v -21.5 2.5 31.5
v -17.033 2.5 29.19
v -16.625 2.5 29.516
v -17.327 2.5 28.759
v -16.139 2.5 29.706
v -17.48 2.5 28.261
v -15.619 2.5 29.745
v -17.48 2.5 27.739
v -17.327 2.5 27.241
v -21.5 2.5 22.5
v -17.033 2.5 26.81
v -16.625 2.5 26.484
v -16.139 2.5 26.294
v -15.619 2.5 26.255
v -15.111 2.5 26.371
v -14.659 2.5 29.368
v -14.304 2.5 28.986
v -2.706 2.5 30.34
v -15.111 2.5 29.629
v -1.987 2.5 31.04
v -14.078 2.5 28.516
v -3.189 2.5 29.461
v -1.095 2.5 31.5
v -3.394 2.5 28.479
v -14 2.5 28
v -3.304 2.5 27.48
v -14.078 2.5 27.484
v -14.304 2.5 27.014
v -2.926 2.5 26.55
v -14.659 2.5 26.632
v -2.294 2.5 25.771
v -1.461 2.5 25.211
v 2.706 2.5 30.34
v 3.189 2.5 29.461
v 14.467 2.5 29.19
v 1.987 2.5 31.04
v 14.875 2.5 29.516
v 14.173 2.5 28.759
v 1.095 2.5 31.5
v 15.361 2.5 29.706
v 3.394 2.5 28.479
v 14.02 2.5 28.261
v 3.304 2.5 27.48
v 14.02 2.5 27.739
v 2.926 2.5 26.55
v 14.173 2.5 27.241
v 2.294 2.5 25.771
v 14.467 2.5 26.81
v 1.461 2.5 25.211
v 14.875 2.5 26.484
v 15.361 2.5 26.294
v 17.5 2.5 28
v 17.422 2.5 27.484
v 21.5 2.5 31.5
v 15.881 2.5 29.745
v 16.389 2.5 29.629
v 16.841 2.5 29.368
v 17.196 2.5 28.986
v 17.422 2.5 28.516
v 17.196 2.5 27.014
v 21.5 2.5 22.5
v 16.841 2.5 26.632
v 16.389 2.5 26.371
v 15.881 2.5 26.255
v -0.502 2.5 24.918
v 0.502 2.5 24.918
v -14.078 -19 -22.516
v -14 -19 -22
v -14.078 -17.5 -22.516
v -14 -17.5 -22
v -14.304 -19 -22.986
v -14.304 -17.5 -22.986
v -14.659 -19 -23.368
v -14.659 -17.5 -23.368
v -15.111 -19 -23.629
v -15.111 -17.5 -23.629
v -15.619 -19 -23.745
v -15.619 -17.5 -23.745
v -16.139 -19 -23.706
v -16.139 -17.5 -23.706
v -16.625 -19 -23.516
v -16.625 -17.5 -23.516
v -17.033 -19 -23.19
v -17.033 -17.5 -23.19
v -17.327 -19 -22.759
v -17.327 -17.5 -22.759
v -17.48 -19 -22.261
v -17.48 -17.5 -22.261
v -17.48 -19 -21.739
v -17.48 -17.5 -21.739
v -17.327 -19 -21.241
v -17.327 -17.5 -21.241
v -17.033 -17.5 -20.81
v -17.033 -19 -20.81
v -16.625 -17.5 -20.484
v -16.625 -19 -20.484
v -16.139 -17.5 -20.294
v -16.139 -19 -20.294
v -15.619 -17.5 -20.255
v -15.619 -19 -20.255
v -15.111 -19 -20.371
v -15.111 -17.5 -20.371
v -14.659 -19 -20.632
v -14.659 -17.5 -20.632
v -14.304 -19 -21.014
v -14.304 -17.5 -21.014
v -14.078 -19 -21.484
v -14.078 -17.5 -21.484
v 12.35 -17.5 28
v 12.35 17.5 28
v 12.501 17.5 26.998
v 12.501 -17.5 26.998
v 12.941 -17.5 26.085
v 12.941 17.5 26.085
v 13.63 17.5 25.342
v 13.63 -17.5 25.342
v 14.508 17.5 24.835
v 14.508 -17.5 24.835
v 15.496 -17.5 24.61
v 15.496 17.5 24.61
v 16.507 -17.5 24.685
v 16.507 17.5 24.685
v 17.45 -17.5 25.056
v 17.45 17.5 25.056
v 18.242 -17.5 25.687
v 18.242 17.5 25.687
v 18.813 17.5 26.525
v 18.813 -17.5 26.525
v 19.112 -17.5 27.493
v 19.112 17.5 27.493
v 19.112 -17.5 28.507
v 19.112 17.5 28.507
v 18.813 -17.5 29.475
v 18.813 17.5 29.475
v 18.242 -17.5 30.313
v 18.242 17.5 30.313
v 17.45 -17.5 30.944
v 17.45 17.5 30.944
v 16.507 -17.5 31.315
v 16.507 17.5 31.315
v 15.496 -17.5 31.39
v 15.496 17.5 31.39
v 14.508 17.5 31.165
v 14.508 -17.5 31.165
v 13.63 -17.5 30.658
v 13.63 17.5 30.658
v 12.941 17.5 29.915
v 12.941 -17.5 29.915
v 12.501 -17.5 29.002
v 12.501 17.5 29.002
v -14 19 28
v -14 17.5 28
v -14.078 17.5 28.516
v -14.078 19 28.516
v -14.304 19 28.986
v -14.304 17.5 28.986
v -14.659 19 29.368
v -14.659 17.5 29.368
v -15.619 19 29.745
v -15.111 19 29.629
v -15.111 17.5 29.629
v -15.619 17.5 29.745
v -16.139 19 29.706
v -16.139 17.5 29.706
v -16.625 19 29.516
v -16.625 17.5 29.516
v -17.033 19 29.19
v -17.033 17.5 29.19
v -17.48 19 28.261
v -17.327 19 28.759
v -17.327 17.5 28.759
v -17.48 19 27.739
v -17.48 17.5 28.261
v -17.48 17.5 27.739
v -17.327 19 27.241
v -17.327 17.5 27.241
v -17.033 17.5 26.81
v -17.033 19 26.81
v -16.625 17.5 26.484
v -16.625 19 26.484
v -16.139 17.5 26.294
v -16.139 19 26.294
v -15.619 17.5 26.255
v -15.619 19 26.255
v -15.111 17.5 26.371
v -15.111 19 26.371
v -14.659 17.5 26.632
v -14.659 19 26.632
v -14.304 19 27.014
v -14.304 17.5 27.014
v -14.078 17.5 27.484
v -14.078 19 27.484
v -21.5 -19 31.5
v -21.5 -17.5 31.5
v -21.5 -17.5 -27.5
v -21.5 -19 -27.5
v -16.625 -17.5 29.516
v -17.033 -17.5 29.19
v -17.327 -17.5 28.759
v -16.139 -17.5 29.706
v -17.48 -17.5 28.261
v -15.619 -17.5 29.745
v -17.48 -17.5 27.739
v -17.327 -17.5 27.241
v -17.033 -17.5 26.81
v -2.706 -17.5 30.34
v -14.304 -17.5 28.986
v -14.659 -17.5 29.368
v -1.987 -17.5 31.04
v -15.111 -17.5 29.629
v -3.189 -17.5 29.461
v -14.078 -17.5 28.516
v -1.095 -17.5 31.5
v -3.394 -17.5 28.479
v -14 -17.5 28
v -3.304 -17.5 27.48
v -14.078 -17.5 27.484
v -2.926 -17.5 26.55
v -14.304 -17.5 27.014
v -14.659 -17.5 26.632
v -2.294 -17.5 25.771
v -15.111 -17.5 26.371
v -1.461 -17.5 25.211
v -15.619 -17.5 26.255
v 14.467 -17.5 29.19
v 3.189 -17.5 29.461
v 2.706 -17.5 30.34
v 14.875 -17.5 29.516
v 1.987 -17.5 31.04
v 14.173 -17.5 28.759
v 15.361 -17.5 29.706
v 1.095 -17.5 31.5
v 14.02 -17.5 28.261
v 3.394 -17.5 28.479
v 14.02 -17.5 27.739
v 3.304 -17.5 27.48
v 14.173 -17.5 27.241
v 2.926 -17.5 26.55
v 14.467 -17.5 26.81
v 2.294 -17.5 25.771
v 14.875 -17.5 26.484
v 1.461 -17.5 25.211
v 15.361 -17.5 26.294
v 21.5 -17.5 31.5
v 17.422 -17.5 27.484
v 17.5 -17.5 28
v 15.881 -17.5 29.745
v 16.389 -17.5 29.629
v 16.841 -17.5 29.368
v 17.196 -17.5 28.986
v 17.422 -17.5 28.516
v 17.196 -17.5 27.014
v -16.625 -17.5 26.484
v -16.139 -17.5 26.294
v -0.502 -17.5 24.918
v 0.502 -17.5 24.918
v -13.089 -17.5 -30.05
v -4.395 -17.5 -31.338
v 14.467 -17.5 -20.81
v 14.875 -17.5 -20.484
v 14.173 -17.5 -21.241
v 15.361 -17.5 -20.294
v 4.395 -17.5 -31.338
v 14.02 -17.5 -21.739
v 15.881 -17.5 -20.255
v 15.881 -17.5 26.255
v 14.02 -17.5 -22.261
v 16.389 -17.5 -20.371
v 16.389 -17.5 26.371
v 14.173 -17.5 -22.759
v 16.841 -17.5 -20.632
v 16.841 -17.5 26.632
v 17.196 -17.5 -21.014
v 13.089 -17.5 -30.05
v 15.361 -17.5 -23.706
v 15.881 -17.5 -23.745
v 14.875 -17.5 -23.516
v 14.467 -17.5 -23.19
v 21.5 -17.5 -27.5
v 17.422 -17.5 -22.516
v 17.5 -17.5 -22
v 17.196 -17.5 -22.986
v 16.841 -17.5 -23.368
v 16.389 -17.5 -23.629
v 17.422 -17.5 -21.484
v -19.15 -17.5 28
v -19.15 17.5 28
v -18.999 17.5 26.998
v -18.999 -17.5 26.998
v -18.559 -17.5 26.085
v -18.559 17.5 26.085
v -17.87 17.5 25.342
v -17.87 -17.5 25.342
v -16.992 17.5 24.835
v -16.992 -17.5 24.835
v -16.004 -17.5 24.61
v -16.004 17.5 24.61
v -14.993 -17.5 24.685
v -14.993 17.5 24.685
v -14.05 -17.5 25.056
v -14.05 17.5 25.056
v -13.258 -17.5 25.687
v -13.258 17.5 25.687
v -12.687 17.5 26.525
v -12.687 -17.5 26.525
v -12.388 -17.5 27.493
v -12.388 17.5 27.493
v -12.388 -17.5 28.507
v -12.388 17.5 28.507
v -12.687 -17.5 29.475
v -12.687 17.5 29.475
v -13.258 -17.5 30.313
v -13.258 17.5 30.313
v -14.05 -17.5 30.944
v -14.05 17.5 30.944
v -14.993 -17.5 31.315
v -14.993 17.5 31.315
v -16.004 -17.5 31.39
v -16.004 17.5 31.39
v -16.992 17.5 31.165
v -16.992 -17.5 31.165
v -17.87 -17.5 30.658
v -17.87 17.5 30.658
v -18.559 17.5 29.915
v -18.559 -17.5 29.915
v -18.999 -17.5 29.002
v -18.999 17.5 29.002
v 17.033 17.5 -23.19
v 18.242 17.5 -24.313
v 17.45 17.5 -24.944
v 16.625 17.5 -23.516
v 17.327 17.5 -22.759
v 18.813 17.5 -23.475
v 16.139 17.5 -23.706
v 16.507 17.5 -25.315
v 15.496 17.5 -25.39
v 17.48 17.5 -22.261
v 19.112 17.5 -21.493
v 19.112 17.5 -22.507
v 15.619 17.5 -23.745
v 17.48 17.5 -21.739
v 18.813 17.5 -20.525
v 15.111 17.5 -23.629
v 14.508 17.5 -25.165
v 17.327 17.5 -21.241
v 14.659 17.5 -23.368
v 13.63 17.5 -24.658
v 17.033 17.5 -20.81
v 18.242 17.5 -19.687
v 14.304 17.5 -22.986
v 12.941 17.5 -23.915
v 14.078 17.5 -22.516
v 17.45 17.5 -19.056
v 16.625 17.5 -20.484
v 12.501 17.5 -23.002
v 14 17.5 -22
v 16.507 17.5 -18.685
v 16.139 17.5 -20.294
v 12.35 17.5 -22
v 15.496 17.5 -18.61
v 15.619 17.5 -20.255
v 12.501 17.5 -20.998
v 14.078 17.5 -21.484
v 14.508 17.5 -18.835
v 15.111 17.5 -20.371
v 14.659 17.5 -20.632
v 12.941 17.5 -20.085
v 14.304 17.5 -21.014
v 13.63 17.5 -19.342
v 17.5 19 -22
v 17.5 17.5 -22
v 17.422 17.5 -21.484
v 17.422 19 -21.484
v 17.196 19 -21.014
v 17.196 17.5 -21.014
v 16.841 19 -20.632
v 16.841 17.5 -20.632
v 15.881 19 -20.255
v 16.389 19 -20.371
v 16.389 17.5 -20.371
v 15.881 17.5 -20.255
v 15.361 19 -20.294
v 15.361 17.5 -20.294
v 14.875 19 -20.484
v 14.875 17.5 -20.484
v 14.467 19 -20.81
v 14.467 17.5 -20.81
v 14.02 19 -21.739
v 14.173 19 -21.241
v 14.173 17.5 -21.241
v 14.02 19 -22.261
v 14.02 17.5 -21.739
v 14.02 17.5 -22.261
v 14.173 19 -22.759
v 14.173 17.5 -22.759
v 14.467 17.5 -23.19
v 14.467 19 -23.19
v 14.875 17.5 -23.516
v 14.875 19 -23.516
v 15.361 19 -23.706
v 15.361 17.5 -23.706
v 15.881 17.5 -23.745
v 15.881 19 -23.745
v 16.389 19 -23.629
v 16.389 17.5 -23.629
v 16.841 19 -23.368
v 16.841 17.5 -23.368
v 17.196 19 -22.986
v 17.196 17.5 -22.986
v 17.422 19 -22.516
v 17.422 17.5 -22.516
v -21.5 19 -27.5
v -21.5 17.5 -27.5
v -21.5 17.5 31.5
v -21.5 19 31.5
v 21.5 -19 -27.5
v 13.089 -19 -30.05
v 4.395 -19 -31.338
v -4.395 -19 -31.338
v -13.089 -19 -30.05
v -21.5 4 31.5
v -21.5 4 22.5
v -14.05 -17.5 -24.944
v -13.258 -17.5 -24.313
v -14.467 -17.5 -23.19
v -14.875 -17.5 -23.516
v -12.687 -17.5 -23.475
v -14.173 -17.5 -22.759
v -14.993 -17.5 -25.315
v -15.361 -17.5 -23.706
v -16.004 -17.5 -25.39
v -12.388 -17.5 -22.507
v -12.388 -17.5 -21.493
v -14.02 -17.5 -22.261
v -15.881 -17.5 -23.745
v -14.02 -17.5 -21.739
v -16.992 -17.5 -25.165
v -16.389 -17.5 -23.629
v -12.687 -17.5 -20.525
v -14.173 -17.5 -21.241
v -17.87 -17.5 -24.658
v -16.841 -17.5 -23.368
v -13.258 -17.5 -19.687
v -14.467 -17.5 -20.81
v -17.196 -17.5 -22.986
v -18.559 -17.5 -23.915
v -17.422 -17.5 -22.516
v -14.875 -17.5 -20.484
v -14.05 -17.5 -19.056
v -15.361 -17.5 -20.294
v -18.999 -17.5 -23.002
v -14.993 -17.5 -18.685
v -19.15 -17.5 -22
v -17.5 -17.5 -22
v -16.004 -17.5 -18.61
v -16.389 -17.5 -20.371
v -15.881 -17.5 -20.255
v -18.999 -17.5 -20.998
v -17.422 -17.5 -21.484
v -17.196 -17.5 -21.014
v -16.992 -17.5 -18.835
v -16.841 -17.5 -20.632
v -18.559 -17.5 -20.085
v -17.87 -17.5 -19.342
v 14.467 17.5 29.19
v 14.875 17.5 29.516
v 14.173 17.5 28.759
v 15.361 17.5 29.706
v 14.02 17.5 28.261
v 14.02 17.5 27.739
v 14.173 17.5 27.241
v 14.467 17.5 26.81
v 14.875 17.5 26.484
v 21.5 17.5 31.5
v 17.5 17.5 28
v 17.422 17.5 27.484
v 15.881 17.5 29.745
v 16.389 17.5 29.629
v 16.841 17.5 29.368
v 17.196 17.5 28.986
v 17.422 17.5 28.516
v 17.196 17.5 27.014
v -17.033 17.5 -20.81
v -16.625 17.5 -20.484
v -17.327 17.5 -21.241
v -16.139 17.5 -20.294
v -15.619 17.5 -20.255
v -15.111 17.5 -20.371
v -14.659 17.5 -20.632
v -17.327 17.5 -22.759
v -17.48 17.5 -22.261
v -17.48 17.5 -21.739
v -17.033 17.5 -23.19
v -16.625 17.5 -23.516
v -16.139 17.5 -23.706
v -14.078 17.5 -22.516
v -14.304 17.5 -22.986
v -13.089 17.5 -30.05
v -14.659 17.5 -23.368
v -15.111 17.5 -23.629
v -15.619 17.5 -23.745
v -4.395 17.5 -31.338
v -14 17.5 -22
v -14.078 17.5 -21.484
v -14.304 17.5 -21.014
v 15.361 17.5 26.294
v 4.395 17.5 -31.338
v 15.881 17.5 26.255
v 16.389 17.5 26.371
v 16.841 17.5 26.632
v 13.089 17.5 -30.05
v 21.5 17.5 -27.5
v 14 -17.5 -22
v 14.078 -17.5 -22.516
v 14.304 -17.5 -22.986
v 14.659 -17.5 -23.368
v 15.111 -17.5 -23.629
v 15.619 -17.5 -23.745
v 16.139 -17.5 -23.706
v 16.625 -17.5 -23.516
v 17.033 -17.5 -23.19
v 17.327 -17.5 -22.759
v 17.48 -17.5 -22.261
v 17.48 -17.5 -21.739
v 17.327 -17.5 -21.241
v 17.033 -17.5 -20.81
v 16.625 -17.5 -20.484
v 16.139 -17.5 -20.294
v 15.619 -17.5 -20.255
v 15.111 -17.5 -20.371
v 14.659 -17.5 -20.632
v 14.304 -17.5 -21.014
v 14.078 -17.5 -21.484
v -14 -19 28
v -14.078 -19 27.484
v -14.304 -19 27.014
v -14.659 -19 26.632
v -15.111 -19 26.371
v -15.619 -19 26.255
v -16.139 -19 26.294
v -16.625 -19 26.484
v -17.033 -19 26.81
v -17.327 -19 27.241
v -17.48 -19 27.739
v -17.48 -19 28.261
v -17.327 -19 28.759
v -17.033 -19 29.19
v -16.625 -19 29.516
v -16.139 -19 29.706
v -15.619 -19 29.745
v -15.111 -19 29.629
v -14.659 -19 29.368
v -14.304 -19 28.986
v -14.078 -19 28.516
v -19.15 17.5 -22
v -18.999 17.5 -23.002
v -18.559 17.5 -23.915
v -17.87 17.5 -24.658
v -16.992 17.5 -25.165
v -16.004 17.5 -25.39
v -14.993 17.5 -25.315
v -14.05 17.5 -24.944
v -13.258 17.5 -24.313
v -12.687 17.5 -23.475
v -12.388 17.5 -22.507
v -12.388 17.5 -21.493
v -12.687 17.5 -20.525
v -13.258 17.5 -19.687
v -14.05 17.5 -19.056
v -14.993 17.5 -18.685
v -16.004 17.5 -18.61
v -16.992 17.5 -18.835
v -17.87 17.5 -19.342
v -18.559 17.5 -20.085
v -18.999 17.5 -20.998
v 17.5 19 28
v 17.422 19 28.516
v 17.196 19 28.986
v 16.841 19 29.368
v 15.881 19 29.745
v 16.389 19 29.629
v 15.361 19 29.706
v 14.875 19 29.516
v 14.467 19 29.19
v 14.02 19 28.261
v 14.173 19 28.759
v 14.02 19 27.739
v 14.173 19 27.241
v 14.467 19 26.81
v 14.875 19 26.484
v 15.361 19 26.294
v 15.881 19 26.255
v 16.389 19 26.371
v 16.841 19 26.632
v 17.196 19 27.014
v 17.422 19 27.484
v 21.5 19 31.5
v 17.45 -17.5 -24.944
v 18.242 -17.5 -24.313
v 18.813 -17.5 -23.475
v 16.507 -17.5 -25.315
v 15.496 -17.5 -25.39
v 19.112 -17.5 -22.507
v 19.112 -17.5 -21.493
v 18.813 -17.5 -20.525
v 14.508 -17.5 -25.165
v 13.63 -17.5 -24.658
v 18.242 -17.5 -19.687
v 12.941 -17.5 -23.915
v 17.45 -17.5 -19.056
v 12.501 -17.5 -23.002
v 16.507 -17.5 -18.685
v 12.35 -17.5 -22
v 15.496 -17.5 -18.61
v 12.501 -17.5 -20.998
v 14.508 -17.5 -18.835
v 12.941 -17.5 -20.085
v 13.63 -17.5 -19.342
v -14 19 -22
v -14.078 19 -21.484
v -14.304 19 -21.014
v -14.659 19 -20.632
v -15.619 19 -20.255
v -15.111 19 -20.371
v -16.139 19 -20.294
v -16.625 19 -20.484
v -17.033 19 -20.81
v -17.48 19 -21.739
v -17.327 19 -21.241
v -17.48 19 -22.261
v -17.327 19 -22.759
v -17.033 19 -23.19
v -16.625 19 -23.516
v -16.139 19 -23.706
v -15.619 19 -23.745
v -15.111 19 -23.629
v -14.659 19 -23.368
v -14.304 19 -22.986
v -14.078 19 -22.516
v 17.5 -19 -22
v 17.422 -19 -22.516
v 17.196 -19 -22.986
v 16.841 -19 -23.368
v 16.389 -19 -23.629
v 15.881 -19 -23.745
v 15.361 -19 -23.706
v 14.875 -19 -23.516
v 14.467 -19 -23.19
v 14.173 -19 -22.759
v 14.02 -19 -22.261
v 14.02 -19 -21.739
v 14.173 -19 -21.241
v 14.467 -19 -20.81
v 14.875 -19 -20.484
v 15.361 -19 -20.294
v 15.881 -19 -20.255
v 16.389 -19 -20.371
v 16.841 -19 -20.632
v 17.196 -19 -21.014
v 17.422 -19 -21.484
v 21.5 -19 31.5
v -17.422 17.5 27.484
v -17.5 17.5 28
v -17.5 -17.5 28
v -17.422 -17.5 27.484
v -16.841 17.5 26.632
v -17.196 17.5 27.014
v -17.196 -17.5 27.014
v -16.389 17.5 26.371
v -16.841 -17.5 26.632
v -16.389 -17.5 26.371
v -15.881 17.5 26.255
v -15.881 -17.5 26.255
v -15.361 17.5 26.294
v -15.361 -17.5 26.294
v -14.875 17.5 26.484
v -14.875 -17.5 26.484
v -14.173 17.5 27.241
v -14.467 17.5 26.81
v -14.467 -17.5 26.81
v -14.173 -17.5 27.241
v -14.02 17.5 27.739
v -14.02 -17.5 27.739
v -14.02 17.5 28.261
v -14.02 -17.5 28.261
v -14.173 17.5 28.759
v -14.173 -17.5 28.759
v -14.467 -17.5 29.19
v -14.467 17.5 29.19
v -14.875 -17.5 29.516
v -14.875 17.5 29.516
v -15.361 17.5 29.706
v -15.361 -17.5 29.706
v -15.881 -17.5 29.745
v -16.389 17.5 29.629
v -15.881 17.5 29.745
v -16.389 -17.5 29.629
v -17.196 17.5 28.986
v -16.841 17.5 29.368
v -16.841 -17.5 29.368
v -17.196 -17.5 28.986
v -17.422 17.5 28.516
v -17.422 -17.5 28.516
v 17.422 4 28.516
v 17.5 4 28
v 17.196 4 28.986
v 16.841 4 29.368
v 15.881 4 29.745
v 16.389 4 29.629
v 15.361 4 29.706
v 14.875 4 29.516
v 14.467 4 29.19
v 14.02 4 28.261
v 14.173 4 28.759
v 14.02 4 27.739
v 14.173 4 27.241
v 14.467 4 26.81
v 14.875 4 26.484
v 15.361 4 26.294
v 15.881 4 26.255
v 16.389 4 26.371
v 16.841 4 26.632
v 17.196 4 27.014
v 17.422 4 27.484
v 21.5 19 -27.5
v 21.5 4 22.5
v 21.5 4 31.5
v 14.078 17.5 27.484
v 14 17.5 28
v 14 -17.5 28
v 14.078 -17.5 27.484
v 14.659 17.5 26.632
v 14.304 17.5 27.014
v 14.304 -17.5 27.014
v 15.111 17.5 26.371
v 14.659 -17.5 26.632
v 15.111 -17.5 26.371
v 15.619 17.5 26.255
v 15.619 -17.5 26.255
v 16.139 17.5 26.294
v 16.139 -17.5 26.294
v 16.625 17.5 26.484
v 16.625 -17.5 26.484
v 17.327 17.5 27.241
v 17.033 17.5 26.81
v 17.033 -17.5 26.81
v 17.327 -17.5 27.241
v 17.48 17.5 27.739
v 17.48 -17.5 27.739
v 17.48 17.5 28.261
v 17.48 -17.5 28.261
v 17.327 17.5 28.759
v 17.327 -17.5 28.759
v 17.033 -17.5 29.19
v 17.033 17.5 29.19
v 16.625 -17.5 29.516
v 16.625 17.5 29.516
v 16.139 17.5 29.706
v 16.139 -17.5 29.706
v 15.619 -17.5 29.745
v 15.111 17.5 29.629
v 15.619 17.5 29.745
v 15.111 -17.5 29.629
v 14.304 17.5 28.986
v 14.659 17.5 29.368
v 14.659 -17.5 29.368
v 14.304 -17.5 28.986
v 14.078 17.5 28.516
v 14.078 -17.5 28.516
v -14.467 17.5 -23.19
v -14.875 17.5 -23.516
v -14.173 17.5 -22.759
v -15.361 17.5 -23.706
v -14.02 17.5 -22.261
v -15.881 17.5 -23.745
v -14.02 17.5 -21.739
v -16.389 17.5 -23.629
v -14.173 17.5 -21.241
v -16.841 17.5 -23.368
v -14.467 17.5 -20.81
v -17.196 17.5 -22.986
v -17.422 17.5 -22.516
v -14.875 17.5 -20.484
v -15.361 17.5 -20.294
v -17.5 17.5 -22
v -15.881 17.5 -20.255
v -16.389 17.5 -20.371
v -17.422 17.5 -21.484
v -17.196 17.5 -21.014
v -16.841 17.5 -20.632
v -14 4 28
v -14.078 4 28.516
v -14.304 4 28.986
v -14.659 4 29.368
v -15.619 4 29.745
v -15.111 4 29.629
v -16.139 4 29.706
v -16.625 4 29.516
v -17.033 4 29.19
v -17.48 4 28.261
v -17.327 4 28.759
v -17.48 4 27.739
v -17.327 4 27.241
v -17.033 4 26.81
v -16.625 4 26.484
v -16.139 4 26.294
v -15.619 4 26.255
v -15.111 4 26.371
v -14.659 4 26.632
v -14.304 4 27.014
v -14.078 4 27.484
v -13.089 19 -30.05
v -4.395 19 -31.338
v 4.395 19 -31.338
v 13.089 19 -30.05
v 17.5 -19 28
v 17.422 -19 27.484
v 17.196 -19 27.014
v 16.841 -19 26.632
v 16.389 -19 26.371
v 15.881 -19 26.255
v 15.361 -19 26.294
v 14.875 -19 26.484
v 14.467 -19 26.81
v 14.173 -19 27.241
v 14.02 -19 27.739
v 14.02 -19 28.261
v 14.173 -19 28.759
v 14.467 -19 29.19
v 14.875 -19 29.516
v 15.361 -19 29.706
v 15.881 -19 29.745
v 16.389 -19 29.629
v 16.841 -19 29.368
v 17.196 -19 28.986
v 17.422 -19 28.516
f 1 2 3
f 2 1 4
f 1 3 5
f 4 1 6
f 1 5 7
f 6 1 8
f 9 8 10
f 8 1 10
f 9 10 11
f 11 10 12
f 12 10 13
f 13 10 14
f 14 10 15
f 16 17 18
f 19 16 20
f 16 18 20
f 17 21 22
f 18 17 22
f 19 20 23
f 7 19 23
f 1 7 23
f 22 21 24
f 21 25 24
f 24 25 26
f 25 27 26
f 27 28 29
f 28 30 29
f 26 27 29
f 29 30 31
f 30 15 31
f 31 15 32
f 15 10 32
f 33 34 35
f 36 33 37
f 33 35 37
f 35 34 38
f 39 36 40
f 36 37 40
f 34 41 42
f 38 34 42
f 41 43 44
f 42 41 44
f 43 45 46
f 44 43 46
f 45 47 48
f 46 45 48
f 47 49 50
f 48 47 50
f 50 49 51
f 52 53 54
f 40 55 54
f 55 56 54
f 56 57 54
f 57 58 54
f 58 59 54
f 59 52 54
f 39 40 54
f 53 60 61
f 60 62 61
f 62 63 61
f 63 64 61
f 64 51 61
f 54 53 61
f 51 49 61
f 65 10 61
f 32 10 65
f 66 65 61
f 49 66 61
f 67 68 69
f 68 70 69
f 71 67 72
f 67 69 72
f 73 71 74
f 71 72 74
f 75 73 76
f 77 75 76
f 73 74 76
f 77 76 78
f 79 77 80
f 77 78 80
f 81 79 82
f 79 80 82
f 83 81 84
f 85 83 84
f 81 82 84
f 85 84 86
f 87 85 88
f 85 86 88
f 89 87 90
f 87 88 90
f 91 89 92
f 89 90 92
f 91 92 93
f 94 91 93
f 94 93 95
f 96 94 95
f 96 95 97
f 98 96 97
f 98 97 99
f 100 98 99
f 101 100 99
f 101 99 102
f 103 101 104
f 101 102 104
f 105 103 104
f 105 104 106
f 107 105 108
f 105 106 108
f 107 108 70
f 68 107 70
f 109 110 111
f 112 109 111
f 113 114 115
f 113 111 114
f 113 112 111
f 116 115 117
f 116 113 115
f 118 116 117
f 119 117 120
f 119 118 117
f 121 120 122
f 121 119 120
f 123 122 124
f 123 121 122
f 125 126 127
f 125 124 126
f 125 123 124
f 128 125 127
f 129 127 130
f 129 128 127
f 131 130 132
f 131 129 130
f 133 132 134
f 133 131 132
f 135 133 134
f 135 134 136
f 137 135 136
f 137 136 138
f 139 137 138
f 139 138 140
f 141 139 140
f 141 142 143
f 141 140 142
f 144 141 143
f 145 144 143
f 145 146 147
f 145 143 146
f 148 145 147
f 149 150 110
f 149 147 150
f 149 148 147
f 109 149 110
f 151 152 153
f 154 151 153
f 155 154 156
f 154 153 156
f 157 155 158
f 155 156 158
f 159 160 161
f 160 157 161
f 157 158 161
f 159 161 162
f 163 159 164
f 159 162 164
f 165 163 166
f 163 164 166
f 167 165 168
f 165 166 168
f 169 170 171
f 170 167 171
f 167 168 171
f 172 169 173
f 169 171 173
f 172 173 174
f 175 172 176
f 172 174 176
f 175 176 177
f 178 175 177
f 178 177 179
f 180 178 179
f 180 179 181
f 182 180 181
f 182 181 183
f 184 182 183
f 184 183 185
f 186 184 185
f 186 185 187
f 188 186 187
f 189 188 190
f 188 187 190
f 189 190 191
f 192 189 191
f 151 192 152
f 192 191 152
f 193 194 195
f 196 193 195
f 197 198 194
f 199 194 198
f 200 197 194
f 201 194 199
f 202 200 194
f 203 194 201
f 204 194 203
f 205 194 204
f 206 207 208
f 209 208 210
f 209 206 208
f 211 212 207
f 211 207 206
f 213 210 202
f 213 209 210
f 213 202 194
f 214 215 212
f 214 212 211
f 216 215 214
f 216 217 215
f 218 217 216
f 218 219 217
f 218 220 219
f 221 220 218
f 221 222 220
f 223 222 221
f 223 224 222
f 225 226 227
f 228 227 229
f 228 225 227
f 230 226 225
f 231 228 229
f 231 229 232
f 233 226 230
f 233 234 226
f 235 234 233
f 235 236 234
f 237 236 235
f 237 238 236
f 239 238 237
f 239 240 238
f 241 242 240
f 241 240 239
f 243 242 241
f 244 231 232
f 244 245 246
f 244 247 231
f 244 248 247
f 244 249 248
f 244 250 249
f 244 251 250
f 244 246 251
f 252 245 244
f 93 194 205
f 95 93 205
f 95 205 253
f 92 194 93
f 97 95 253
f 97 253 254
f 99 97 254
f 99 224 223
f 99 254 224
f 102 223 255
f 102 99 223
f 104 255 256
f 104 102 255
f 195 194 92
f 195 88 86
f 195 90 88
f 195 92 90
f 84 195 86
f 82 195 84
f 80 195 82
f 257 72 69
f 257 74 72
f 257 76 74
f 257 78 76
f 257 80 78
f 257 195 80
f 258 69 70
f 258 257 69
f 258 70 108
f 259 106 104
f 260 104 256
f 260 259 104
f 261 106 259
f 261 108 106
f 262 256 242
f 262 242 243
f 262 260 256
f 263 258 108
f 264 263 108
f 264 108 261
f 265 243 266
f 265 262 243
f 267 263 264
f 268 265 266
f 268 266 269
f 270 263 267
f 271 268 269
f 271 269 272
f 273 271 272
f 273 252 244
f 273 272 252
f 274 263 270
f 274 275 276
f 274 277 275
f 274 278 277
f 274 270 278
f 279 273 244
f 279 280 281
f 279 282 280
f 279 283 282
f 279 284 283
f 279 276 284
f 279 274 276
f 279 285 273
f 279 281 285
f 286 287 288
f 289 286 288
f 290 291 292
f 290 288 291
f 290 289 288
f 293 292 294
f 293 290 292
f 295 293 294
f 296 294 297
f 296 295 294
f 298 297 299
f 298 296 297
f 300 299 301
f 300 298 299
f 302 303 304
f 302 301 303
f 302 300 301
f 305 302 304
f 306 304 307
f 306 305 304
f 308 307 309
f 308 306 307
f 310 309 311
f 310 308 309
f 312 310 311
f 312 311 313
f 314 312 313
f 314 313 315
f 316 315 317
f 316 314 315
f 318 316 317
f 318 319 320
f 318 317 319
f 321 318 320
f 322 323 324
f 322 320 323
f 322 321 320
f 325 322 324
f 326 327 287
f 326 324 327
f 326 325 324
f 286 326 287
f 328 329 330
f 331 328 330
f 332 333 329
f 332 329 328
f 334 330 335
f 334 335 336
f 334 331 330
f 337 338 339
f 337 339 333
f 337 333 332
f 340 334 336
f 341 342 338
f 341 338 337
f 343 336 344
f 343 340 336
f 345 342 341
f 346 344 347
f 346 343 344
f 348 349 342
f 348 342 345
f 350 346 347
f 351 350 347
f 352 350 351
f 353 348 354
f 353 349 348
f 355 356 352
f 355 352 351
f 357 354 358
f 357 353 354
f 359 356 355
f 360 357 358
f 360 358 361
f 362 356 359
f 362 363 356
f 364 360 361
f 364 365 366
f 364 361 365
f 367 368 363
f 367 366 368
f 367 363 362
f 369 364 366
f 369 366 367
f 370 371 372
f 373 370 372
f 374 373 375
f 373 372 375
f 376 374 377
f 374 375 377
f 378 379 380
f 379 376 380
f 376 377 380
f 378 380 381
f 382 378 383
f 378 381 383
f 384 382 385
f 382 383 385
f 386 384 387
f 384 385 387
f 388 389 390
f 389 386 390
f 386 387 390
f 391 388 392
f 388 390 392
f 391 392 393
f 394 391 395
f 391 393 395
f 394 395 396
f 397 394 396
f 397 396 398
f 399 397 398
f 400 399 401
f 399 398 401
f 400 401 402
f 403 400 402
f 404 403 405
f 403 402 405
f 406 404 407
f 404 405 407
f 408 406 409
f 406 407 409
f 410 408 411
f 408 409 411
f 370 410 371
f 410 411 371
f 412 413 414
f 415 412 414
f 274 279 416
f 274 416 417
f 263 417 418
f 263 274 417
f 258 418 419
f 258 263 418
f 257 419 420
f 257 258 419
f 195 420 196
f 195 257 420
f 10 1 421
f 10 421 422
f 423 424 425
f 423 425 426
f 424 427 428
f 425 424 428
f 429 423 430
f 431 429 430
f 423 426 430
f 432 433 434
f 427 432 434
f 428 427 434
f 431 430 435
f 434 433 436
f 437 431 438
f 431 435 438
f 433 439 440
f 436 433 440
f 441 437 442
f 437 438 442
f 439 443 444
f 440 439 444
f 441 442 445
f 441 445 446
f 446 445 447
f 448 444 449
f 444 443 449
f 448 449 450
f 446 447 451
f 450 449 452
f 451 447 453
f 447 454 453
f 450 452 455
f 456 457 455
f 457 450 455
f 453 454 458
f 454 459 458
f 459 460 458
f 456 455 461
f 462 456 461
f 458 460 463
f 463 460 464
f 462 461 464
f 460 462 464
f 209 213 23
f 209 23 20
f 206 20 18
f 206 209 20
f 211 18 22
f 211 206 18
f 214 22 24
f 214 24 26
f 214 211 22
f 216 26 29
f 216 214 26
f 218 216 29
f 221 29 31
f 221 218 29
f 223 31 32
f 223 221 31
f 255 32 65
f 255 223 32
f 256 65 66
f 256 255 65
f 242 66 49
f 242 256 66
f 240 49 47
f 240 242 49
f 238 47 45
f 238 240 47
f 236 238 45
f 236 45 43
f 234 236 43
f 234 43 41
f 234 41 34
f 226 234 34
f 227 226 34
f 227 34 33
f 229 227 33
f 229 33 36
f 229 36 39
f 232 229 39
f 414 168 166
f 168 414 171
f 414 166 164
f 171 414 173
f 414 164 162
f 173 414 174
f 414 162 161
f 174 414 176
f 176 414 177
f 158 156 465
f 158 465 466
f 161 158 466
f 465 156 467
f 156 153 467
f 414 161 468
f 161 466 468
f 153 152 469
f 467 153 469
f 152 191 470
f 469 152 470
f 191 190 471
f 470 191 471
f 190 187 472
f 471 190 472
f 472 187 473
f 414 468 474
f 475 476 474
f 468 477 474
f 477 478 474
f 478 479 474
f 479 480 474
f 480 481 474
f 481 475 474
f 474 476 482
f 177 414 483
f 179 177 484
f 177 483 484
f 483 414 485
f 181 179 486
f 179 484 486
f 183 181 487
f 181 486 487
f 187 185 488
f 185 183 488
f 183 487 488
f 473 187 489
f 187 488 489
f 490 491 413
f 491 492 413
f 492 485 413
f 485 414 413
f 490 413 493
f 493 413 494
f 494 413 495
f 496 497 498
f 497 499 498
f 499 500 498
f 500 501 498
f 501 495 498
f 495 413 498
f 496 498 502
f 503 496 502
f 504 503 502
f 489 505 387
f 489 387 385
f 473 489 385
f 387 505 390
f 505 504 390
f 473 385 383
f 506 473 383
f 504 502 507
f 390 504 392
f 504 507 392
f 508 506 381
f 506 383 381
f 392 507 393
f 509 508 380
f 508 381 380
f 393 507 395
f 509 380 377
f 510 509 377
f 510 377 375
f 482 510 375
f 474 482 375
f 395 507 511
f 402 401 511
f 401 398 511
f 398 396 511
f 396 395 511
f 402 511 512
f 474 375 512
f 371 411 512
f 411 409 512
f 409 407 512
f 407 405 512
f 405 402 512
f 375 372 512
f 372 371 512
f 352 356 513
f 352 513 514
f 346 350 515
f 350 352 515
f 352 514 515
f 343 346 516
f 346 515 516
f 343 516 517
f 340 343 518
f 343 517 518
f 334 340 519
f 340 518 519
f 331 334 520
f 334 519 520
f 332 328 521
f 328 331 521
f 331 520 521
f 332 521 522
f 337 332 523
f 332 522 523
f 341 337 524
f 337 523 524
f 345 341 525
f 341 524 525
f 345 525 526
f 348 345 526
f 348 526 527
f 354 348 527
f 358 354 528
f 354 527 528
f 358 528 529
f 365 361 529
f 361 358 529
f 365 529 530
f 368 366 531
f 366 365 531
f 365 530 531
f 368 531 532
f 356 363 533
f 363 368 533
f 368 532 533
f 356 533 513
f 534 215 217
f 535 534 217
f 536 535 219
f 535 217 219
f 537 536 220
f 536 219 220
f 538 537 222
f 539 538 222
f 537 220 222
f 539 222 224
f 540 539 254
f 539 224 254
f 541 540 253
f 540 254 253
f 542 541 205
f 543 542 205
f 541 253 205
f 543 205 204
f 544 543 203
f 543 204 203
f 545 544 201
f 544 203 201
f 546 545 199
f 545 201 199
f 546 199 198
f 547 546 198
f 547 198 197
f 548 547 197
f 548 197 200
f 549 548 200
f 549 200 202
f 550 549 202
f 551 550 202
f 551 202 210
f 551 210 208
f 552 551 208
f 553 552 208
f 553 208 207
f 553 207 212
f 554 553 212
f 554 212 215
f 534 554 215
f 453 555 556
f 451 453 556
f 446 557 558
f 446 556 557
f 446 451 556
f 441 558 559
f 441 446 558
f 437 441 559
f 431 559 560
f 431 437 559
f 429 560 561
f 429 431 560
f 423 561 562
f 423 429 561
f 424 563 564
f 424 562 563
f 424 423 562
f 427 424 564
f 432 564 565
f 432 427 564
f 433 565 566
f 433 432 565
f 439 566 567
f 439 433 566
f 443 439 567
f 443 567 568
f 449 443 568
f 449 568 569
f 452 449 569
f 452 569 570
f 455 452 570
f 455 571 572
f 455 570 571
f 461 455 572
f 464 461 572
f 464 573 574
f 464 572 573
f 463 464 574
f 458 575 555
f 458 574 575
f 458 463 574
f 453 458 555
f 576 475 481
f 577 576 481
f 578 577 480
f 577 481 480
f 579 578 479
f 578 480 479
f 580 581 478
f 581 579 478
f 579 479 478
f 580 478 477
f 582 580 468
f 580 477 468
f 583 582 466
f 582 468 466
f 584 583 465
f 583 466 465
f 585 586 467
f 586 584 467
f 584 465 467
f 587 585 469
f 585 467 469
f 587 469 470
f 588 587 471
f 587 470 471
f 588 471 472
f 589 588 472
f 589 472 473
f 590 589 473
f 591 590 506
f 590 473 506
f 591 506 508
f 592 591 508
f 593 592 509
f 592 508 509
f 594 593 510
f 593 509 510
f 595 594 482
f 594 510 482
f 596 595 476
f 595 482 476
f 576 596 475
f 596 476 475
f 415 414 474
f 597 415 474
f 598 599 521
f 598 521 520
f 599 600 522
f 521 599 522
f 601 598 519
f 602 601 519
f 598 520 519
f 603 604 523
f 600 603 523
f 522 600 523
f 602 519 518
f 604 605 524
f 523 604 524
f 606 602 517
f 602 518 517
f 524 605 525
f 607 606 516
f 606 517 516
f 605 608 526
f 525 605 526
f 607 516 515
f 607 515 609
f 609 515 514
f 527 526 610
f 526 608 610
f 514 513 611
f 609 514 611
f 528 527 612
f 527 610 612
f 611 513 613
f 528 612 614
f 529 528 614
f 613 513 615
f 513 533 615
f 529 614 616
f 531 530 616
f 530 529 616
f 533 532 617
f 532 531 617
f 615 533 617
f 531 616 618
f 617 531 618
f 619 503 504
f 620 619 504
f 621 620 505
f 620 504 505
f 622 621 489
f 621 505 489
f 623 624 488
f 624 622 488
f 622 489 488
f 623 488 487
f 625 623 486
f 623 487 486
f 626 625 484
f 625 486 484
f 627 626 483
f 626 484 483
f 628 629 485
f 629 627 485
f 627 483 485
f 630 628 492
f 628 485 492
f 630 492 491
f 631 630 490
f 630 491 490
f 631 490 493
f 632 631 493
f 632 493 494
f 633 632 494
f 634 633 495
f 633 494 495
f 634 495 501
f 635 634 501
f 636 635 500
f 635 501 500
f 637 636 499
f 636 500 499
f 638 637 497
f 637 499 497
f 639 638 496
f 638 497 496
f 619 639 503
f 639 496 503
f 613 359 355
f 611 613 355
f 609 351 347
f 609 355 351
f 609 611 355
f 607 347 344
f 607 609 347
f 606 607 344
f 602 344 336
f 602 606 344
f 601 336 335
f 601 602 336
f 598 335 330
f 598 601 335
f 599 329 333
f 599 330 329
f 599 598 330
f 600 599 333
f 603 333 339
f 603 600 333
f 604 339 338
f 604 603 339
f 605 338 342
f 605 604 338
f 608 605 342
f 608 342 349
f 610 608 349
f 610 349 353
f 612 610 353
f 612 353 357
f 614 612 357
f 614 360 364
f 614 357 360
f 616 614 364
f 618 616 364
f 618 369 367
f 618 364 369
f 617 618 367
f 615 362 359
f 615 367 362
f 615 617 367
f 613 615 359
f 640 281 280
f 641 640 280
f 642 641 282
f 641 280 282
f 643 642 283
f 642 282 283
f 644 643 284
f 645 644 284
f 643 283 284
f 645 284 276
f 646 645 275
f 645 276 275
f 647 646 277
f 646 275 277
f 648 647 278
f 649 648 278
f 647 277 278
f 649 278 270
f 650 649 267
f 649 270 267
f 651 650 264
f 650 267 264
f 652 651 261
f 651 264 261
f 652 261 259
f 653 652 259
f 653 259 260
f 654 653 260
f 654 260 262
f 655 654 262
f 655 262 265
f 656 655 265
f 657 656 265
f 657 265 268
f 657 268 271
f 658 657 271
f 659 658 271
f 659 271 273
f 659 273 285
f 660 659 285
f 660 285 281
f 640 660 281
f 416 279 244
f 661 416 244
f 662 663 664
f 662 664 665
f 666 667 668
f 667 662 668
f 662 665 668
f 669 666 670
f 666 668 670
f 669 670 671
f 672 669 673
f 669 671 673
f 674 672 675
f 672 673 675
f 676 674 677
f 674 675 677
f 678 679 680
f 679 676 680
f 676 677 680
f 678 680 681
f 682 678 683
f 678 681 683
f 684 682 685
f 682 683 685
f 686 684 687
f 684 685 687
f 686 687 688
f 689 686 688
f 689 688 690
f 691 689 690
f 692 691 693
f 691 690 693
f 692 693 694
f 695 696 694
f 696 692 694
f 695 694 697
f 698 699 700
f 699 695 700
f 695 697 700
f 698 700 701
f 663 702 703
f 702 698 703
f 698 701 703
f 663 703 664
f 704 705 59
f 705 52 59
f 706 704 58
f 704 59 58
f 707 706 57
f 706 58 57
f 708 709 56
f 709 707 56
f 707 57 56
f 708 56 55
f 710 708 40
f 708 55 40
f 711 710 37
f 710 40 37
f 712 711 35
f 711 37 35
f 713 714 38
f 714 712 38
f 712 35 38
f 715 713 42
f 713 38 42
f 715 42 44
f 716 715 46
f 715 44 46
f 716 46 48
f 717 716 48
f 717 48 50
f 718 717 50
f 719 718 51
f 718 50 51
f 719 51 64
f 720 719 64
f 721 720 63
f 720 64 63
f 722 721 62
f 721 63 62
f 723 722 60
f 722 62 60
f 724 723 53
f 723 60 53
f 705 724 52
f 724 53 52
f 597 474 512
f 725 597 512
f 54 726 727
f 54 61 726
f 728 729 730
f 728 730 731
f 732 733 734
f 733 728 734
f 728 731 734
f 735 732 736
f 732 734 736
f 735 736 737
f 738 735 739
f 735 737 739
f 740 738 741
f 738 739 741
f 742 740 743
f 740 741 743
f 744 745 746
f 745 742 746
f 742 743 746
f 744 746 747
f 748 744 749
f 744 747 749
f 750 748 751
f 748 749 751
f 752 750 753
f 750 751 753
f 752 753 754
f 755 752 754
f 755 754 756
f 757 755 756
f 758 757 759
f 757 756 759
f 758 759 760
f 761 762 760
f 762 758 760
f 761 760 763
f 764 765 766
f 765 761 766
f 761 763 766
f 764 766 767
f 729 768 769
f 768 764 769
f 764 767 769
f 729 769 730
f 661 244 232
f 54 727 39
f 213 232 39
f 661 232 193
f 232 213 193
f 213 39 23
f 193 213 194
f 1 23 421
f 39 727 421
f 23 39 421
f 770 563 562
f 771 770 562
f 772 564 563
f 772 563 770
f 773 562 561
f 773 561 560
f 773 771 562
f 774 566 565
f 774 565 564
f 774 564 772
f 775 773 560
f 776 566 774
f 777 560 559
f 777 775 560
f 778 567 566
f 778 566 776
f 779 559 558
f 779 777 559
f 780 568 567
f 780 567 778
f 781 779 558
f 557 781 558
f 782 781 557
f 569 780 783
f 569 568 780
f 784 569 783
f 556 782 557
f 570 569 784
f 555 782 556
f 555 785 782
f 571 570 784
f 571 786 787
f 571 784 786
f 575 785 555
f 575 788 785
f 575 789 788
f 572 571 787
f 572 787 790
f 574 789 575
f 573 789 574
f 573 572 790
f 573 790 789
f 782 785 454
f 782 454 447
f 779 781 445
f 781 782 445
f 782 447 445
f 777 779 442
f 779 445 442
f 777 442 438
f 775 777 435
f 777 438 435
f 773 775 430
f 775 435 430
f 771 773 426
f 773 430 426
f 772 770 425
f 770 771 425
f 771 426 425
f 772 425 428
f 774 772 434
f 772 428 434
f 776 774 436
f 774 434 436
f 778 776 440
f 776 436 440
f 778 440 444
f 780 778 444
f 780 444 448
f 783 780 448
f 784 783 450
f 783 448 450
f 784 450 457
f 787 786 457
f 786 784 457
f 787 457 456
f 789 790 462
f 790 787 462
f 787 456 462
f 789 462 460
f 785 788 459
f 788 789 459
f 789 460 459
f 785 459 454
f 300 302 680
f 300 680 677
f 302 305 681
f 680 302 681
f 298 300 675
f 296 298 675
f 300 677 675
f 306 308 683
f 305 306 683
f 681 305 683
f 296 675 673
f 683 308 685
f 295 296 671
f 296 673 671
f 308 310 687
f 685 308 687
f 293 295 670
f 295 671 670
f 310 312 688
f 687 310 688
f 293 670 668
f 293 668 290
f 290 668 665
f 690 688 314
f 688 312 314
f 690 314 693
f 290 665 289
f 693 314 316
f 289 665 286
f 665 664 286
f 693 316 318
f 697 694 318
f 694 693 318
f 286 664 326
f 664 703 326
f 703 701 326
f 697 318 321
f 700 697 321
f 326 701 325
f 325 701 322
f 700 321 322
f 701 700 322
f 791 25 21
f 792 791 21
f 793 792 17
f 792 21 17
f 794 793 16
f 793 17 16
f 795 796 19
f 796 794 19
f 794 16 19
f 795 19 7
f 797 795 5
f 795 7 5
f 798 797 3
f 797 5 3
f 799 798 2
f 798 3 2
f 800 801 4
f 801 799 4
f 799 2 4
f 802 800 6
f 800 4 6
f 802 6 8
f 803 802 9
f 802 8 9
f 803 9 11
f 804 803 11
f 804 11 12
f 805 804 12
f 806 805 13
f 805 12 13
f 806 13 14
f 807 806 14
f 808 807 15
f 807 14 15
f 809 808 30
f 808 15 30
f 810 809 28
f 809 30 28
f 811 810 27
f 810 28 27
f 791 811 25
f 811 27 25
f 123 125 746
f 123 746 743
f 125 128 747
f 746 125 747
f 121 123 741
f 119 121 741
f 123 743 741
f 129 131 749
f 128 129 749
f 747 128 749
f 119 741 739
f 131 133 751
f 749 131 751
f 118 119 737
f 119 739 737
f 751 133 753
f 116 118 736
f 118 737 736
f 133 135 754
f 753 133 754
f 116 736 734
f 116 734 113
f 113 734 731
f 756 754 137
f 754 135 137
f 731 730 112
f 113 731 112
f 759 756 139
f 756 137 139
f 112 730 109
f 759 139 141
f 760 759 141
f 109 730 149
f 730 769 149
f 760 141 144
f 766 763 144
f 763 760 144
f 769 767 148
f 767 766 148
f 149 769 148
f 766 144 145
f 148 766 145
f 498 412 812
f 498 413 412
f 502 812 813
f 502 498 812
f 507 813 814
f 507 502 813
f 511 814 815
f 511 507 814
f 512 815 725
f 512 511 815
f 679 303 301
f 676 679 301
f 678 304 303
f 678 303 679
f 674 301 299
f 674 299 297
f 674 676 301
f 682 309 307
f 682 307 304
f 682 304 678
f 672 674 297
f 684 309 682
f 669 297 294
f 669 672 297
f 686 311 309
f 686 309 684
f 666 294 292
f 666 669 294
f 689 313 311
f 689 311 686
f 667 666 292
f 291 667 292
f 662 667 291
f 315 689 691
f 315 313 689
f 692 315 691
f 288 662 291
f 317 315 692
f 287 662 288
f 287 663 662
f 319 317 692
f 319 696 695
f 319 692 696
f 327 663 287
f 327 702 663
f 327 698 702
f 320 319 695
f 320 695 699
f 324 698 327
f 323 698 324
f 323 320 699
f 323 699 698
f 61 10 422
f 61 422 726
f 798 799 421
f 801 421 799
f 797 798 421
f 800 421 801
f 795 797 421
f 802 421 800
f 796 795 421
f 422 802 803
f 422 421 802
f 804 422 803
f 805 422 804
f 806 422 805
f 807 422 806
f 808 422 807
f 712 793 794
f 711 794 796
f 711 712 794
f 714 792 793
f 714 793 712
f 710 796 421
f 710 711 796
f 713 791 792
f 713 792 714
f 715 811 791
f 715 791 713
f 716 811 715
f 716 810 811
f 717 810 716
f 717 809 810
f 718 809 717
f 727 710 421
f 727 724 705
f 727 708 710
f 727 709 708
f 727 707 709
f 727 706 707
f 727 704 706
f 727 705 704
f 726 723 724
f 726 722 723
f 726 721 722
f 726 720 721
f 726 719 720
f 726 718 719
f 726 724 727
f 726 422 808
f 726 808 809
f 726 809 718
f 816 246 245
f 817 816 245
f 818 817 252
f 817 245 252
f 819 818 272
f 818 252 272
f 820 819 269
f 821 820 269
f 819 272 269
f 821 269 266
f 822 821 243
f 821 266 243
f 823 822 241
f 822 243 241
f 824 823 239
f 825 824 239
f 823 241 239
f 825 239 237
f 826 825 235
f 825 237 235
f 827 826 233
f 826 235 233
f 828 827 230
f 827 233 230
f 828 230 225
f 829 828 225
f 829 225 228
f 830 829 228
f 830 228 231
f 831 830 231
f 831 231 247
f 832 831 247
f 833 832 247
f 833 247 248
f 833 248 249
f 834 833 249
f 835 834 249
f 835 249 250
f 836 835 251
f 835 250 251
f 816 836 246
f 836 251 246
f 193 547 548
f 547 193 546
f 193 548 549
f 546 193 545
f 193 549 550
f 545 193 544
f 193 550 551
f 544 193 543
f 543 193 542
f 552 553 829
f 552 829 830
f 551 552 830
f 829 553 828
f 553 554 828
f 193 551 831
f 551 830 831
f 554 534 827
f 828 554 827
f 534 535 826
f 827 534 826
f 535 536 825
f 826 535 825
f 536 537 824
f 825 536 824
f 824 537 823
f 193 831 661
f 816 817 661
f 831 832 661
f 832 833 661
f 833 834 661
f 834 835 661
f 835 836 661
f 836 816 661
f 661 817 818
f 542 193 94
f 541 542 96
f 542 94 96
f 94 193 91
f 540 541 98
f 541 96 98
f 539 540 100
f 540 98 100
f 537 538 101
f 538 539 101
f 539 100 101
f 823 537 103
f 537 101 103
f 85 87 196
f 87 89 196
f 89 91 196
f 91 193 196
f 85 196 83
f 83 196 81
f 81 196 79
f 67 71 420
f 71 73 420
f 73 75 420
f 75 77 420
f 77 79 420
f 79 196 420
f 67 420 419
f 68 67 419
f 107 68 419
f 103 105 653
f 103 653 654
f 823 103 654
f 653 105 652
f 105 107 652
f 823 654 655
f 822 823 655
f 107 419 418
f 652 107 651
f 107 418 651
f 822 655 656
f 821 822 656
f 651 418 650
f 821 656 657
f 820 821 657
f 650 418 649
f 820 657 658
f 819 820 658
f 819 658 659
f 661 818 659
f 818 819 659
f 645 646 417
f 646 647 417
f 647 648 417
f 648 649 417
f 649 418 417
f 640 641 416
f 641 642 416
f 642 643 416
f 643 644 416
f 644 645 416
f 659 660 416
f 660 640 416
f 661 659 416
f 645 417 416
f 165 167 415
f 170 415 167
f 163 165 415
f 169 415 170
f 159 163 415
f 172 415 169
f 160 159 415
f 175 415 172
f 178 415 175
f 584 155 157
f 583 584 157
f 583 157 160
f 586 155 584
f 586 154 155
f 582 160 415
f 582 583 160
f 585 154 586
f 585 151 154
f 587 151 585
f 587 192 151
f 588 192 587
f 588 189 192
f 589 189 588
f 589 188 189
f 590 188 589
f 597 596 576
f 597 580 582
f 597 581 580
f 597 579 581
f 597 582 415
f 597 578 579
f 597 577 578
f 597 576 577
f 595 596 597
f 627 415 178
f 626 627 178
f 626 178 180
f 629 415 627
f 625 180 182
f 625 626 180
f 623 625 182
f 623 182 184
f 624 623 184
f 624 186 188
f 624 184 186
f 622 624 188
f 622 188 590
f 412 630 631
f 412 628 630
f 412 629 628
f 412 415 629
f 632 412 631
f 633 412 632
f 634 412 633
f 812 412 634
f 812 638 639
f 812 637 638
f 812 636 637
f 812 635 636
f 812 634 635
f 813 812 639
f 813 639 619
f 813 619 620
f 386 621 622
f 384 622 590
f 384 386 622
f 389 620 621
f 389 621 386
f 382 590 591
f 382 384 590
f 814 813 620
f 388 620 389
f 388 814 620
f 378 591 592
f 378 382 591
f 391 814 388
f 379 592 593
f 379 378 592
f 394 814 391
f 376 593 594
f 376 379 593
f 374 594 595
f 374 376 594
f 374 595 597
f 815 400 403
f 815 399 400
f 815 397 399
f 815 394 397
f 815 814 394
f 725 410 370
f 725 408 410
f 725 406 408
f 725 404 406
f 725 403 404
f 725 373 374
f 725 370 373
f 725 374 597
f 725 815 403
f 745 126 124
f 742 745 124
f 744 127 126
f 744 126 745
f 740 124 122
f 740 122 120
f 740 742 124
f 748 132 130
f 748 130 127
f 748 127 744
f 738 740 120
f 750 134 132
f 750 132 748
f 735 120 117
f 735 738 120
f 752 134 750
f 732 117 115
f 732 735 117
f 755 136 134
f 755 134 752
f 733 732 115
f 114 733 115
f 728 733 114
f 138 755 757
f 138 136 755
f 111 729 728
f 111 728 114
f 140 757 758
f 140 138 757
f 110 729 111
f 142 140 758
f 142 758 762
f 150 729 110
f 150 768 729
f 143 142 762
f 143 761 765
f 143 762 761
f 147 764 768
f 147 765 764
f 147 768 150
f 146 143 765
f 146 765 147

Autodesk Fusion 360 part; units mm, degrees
ref_plane "Arbeitsebene1" through (0, -17.5, 0) normal (0, 1, 0) x (0, 0, 1)
sketch "Skizze1" plane through (0, -17.5, 0) normal (0, 1, 0) x (1, 0, 0)
  line L0 (-21.5, 31.5) -> (21.5, 31.5) construction
  line L1 (21.5, 31.5) -> (21.5, -31.5)
  line L2 (21.5, -31.5) -> (-21.5, -31.5)
  line L3 (-21.5, -31.5) -> (-21.5, 31.5)
  arc A0 (21.5, 27.5) -> (-21.5, 27.5) centre (0, -28.2812) ccw
  circle A1 centre (-15.75, -28) radius 1.75
  circle A2 centre (15.75, -28) radius 1.75
  circle A3 centre (15.75, 22) radius 1.75
  circle A4 centre (-15.75, 22) radius 1.75
  dimension "d2" = 43
  dimension "d3" = 21.5
  dimension "d4" = 63
  dimension "d5" = 31.5
  dimension "d6" = 59
  dimension "d9" = 3.5
  dimension "d10" = 3.5
  dimension "d11" = 31.5
  dimension "d12" = 15.75
  dimension "d13" = 50
ref_plane "Arbeitsebene2" through (0, 17.5, 0) normal (0, 1, 0) x (0, 0, 1)
sketch "Skizze2" plane through (0, 17.5, 0) normal (0, 1, 0) x (1, 0, 0)
  circle A0 centre (15.75, -28) radius 1.75
  circle A1 centre (15.75, 22) radius 1.75
  circle A2 centre (-15.75, 22) radius 1.75
  circle A3 centre (-15.75, -28) radius 1.75
  line L0 (21.5, -31.5) -> (21.5, 27.5)
  arc A4 (21.5, 27.5) -> (-21.5, 27.5) centre (0, -28.2812) ccw
  line L1 (-21.5, 27.5) -> (-21.5, -31.5)
  line L2 (-21.5, -31.5) -> (21.5, -31.5)
extrude "Extrusion3" add sketch "Skizze2" along normal blind 1.5 makes body 1
extrude "Extrusion4" add sketch "Skizze1" against normal blind 1.5 separate body makes body 2
ref_plane "Arbeitsebene3" through (0, 2.5, -2.1434) normal (0, 1, 0) x (1, 0, 0)
sketch "Skizze3" plane through (0, 2.5, -2.1434) normal (0, 1, 0) x (1, 0, 0)
  line L0 (-21.5, -24.6434) -> (21.5, -24.6434)
  line L1 (21.5, -24.6434) -> (21.5, -33.6434)
  line L2 (21.5, -33.6434) -> (-21.5, -33.6434)
  line L3 (-21.5, -33.6434) -> (-21.5, -24.6434)
  line L4 (-21.5, 25.3566) -> (-21.5, -33.6434)
  line L5 (21.5, -33.6434) -> (21.5, 25.3566)
  line L6 (-21.5, -33.6434) -> (21.5, -33.6434)
  circle A0 centre (-15.75, -30.1434) radius 1.75
  circle A1 centre (15.75, -30.1434) radius 1.75
  dimension "d22" = 9
extrude "Extrusion6" add sketch "Skizze3" along normal blind 1.5 separate body makes body 3
sketch "Skizze4" plane through (0, -17.5, 0) normal (0, 1, 0) x (-1, 0, 0)
  circle A0 centre (15.75, 28) radius 1.75
  circle A1 centre (-15.75, 28) radius 1.75
  circle A2 centre (15.75, -22) radius 1.75
  circle A3 centre (-15.75, -22) radius 1.75
  line L0 (-21.5, 31.5) -> (-21.5, -27.5)
  arc A4 (-21.5, -27.5) -> (21.5, -27.5) centre (0, 28.2812) ccw
  line L1 (21.5, -27.5) -> (21.5, 31.5)
  line L2 (21.5, 31.5) -> (-21.5, 31.5)
  circle A5 centre (15.75, -22) radius 3.4
  circle A6 centre (-15.75, -22) radius 3.4
  circle A7 centre (15.75, 28) radius 3.4
  circle A8 centre (-15.75, 28) radius 3.4
  circle A9 centre (0, 28.2812) radius 3.4
  dimension "d27" = 6.8
extrude "Extrusion7" add sketch "Skizze4" along normal blind 35 separate body contours A5 | A6 | A7 | A8 makes body 4 at (-19.1331, 5.8333, 27.6615) makes body 5 at (-19.1331, 5.8333, -22.3385) makes body 6 at (12.3669, 5.8333, 27.6615) makes body 7 at (12.3669, 5.8333, -22.3385)
extrude "Extrusion8" add sketch "Skizze4" along normal blind 20 contours L2 A9 picked at (-0.1387, 27.0692) bodies 2 4 6 3
equation "d1 = ( -35 / 2 ) * 1 mm"
equation "d3 = d2 / 2"
equation "d5 = d4 / 2"
equation "d12 = d11 / 2"
equation "d16 = ( 35 / 2 ) * 1 mm"
